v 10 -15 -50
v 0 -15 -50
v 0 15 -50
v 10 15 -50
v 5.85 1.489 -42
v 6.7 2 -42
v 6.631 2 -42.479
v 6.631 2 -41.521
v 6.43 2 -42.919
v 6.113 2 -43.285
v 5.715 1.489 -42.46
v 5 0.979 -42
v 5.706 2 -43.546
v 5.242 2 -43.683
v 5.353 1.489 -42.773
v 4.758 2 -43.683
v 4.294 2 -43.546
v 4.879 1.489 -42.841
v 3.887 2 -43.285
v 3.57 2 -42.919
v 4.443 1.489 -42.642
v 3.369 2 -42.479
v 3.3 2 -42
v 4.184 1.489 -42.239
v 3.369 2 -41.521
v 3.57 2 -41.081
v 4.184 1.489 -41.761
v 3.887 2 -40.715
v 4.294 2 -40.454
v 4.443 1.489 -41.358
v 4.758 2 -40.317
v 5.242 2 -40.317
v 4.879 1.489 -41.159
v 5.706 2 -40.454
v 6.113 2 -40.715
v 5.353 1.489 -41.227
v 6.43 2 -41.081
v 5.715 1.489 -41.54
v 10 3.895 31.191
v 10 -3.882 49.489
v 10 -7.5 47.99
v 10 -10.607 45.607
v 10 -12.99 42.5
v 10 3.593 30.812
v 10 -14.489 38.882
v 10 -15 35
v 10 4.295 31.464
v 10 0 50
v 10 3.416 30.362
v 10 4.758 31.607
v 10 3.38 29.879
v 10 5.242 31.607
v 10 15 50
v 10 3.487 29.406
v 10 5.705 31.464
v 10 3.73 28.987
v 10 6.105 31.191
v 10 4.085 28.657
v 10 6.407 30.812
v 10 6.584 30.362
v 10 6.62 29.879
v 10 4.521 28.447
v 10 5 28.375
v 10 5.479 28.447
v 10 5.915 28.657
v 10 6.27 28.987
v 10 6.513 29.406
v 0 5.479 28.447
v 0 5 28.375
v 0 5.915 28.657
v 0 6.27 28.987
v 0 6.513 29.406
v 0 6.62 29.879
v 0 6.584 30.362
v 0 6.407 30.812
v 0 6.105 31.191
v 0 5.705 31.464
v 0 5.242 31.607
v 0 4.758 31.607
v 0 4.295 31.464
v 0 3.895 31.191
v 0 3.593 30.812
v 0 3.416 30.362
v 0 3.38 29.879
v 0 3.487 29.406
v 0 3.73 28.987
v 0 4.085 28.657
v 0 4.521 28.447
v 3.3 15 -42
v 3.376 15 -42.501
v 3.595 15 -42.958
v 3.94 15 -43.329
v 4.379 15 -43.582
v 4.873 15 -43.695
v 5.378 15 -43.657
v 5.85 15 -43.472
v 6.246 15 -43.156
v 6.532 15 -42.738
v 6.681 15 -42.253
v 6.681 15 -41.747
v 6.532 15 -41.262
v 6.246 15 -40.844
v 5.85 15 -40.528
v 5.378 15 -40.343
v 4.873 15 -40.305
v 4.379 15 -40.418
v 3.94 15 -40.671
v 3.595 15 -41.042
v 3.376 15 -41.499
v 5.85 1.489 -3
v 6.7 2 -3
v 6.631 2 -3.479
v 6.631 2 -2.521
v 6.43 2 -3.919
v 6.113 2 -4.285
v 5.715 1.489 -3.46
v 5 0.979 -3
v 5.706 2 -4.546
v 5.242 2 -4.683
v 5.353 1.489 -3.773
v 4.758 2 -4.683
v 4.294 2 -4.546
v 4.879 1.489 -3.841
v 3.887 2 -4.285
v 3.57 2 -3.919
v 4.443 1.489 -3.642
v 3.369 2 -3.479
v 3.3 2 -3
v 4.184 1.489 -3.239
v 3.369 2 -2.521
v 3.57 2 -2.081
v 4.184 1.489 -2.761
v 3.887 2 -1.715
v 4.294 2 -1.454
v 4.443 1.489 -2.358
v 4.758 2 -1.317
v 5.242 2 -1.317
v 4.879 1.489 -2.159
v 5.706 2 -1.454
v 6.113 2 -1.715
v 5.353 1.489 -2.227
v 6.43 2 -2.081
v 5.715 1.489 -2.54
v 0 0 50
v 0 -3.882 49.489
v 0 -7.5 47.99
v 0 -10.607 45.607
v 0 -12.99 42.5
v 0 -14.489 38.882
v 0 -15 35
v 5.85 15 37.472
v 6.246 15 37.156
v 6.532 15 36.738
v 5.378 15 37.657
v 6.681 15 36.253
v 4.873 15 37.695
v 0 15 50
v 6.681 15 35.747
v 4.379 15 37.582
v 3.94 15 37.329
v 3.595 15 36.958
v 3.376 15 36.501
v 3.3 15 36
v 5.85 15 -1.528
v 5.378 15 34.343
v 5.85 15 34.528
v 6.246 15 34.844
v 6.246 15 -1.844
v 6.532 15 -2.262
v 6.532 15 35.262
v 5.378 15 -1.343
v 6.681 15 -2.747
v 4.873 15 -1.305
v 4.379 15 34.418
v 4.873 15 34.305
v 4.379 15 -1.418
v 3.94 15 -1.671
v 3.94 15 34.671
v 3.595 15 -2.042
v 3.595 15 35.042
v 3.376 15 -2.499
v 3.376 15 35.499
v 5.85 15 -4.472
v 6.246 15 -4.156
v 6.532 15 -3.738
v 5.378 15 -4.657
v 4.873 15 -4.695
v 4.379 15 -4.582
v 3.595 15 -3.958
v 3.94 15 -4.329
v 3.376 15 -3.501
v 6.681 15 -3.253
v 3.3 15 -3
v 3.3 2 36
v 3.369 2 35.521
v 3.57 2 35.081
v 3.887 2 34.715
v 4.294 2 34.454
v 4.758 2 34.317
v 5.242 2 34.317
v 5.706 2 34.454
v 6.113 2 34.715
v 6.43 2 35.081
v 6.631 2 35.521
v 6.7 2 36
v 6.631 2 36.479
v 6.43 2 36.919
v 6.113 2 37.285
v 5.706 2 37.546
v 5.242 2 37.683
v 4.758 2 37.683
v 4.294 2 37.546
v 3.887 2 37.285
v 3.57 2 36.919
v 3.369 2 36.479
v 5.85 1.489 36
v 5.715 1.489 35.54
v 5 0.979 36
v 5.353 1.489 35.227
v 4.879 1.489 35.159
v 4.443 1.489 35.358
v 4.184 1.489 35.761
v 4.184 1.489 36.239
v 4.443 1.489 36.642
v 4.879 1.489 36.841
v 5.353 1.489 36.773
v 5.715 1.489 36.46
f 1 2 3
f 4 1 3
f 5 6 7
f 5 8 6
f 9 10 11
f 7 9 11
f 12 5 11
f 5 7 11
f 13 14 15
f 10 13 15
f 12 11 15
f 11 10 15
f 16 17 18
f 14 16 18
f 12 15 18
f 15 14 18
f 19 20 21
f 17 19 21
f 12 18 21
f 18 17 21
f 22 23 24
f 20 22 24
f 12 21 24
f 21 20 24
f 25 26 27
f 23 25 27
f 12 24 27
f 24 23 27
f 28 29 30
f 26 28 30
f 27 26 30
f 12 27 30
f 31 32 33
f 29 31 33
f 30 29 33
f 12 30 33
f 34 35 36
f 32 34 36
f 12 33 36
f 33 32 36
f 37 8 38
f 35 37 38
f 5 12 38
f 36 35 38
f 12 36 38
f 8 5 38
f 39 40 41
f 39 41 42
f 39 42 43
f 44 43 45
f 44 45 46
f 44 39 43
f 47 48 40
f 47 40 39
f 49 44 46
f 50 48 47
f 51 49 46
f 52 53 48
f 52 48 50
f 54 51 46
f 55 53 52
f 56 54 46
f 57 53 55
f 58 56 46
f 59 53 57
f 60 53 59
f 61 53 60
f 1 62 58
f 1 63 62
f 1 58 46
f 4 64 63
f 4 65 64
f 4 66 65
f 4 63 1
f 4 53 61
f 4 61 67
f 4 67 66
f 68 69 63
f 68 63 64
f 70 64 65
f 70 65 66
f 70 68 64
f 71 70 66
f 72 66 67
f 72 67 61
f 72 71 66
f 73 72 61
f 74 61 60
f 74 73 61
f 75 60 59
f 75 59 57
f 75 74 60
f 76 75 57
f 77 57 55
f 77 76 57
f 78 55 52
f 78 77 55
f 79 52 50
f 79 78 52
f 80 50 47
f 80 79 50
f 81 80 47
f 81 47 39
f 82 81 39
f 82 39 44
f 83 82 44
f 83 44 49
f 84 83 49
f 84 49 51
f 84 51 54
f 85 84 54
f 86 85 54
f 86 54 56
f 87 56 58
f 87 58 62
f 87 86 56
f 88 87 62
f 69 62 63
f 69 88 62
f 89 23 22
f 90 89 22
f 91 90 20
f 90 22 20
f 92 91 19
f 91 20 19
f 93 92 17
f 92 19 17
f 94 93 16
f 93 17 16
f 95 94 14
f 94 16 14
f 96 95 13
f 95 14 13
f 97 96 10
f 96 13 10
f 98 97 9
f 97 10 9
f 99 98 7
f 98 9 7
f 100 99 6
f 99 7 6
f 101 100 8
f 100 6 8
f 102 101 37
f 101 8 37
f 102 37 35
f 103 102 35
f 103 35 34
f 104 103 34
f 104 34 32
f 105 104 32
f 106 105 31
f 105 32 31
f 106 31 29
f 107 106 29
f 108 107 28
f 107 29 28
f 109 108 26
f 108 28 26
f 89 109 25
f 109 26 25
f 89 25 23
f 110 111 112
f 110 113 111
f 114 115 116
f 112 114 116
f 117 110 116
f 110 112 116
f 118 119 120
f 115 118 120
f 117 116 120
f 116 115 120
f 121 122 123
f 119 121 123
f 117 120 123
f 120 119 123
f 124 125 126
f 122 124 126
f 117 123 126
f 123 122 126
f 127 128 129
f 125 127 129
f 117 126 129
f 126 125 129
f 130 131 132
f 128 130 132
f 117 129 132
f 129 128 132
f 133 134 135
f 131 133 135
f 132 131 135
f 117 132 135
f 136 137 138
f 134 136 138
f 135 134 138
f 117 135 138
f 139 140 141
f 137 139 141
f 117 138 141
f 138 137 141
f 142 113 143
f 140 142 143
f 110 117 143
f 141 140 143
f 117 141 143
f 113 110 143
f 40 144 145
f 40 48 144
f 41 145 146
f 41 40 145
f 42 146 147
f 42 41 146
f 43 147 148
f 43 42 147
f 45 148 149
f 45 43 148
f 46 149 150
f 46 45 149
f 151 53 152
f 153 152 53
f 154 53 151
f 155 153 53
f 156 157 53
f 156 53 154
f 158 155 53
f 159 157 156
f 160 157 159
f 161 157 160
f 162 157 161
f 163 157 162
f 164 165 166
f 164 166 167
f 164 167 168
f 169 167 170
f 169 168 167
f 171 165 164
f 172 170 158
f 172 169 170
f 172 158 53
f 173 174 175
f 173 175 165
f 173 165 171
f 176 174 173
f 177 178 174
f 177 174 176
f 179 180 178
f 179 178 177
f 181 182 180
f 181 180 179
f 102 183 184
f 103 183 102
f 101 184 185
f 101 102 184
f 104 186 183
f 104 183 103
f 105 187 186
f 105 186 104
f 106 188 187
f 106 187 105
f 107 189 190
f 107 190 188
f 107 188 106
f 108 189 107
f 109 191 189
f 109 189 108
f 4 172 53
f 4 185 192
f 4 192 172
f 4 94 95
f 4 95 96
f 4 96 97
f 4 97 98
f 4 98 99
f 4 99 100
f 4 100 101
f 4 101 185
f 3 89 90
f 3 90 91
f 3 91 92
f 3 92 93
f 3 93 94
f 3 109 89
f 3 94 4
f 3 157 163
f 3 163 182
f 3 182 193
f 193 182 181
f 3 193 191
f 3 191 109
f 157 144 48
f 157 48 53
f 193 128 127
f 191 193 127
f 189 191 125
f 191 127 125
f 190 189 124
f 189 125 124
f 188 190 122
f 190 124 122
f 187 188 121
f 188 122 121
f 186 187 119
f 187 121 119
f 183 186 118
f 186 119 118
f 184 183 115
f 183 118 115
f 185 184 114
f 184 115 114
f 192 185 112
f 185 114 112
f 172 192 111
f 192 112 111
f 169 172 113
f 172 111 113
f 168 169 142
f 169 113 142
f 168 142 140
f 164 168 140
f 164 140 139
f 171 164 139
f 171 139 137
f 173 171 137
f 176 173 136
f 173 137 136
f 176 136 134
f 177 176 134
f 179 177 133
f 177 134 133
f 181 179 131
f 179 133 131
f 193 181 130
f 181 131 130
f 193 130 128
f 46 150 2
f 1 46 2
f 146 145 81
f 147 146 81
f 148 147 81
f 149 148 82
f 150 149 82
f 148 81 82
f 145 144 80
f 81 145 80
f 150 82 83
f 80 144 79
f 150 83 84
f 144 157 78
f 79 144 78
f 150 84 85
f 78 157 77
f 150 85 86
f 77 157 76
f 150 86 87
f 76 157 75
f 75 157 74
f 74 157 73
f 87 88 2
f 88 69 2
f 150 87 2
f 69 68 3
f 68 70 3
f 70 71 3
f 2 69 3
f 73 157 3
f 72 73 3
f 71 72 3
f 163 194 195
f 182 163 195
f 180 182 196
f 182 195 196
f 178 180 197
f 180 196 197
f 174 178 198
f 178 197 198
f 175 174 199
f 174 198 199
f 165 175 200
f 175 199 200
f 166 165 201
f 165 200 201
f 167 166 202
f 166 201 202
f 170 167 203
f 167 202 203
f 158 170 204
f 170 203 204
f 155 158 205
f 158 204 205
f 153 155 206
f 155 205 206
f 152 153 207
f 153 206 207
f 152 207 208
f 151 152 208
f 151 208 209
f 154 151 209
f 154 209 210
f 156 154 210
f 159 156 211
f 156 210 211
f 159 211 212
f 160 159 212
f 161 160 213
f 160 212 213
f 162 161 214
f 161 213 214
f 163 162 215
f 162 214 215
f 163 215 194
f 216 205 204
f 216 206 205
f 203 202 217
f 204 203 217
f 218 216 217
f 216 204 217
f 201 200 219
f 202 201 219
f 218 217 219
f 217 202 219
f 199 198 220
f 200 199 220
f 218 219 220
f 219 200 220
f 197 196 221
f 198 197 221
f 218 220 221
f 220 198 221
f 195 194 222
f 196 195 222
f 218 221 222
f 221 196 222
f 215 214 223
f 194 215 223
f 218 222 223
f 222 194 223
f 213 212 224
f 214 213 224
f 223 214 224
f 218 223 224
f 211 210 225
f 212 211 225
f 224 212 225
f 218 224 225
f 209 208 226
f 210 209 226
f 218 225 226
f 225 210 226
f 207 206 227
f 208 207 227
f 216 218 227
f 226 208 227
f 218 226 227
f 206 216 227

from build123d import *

# Parameters (mm, degrees)
SKETCH1_W                     = 100
SKETCH1_H                     = 30
SKETCH1_R                     = 1.625
BOSS_EXTRUDE1_DEPTH           = 10
FILLET1_R                     = 15
CBORE_FOR_M3_SHCS_D           = 3.4
CBORE_FOR_M3_SHCS_DEPTH       = 23
CBORE_FOR_M3_SHCS_CBORE_D     = 6.5
CBORE_FOR_M3_SHCS_CBORE_DEPTH = 3
CBORE_FOR_M3_SHCS_TIP         = 1.021463052


with BuildPart() as part:
    # Sketch1 → Boss-Extrude1 (new body)
    with BuildSketch(Plane(origin=(0, 0, 0), x_dir=(0, 0, -1), z_dir=(1, 0, 0))):
        Rectangle(SKETCH1_W, SKETCH1_H)
        with Locations((-30, 5)):
            Circle(SKETCH1_R, mode=Mode.SUBTRACT)
    extrude(amount=BOSS_EXTRUDE1_DEPTH)

    # Fillet1
    fillet1_edges = [part.edges().sort_by_distance(p)[0] for p in [
        (5, -15, 50),
    ]]
    fillet(fillet1_edges, radius=FILLET1_R)

    # CBORE for M3 SHCS
    with Locations(Plane(origin=(-726.293536786, 25, -1323.282701689), x_dir=(1, 0, 0), z_dir=(0, 1, 0))):
        with Locations((731.293536786, -1281.282701689), (731.293536786, -1359.282701689), (621.293536786, -1281.282701689), (621.293536786, -1365.282701689), (621.293536786, -1323.282701689), (731.293536786, -1320.282701689)):
            CounterBoreHole(CBORE_FOR_M3_SHCS_D / 2, CBORE_FOR_M3_SHCS_CBORE_D / 2, CBORE_FOR_M3_SHCS_CBORE_DEPTH, depth=CBORE_FOR_M3_SHCS_DEPTH)
            with Locations((0, 0, -(CBORE_FOR_M3_SHCS_DEPTH + CBORE_FOR_M3_SHCS_TIP / 2))):  # 118° drill point
                Cone(0, CBORE_FOR_M3_SHCS_D / 2, CBORE_FOR_M3_SHCS_TIP, mode=Mode.SUBTRACT)


solid = part.part
